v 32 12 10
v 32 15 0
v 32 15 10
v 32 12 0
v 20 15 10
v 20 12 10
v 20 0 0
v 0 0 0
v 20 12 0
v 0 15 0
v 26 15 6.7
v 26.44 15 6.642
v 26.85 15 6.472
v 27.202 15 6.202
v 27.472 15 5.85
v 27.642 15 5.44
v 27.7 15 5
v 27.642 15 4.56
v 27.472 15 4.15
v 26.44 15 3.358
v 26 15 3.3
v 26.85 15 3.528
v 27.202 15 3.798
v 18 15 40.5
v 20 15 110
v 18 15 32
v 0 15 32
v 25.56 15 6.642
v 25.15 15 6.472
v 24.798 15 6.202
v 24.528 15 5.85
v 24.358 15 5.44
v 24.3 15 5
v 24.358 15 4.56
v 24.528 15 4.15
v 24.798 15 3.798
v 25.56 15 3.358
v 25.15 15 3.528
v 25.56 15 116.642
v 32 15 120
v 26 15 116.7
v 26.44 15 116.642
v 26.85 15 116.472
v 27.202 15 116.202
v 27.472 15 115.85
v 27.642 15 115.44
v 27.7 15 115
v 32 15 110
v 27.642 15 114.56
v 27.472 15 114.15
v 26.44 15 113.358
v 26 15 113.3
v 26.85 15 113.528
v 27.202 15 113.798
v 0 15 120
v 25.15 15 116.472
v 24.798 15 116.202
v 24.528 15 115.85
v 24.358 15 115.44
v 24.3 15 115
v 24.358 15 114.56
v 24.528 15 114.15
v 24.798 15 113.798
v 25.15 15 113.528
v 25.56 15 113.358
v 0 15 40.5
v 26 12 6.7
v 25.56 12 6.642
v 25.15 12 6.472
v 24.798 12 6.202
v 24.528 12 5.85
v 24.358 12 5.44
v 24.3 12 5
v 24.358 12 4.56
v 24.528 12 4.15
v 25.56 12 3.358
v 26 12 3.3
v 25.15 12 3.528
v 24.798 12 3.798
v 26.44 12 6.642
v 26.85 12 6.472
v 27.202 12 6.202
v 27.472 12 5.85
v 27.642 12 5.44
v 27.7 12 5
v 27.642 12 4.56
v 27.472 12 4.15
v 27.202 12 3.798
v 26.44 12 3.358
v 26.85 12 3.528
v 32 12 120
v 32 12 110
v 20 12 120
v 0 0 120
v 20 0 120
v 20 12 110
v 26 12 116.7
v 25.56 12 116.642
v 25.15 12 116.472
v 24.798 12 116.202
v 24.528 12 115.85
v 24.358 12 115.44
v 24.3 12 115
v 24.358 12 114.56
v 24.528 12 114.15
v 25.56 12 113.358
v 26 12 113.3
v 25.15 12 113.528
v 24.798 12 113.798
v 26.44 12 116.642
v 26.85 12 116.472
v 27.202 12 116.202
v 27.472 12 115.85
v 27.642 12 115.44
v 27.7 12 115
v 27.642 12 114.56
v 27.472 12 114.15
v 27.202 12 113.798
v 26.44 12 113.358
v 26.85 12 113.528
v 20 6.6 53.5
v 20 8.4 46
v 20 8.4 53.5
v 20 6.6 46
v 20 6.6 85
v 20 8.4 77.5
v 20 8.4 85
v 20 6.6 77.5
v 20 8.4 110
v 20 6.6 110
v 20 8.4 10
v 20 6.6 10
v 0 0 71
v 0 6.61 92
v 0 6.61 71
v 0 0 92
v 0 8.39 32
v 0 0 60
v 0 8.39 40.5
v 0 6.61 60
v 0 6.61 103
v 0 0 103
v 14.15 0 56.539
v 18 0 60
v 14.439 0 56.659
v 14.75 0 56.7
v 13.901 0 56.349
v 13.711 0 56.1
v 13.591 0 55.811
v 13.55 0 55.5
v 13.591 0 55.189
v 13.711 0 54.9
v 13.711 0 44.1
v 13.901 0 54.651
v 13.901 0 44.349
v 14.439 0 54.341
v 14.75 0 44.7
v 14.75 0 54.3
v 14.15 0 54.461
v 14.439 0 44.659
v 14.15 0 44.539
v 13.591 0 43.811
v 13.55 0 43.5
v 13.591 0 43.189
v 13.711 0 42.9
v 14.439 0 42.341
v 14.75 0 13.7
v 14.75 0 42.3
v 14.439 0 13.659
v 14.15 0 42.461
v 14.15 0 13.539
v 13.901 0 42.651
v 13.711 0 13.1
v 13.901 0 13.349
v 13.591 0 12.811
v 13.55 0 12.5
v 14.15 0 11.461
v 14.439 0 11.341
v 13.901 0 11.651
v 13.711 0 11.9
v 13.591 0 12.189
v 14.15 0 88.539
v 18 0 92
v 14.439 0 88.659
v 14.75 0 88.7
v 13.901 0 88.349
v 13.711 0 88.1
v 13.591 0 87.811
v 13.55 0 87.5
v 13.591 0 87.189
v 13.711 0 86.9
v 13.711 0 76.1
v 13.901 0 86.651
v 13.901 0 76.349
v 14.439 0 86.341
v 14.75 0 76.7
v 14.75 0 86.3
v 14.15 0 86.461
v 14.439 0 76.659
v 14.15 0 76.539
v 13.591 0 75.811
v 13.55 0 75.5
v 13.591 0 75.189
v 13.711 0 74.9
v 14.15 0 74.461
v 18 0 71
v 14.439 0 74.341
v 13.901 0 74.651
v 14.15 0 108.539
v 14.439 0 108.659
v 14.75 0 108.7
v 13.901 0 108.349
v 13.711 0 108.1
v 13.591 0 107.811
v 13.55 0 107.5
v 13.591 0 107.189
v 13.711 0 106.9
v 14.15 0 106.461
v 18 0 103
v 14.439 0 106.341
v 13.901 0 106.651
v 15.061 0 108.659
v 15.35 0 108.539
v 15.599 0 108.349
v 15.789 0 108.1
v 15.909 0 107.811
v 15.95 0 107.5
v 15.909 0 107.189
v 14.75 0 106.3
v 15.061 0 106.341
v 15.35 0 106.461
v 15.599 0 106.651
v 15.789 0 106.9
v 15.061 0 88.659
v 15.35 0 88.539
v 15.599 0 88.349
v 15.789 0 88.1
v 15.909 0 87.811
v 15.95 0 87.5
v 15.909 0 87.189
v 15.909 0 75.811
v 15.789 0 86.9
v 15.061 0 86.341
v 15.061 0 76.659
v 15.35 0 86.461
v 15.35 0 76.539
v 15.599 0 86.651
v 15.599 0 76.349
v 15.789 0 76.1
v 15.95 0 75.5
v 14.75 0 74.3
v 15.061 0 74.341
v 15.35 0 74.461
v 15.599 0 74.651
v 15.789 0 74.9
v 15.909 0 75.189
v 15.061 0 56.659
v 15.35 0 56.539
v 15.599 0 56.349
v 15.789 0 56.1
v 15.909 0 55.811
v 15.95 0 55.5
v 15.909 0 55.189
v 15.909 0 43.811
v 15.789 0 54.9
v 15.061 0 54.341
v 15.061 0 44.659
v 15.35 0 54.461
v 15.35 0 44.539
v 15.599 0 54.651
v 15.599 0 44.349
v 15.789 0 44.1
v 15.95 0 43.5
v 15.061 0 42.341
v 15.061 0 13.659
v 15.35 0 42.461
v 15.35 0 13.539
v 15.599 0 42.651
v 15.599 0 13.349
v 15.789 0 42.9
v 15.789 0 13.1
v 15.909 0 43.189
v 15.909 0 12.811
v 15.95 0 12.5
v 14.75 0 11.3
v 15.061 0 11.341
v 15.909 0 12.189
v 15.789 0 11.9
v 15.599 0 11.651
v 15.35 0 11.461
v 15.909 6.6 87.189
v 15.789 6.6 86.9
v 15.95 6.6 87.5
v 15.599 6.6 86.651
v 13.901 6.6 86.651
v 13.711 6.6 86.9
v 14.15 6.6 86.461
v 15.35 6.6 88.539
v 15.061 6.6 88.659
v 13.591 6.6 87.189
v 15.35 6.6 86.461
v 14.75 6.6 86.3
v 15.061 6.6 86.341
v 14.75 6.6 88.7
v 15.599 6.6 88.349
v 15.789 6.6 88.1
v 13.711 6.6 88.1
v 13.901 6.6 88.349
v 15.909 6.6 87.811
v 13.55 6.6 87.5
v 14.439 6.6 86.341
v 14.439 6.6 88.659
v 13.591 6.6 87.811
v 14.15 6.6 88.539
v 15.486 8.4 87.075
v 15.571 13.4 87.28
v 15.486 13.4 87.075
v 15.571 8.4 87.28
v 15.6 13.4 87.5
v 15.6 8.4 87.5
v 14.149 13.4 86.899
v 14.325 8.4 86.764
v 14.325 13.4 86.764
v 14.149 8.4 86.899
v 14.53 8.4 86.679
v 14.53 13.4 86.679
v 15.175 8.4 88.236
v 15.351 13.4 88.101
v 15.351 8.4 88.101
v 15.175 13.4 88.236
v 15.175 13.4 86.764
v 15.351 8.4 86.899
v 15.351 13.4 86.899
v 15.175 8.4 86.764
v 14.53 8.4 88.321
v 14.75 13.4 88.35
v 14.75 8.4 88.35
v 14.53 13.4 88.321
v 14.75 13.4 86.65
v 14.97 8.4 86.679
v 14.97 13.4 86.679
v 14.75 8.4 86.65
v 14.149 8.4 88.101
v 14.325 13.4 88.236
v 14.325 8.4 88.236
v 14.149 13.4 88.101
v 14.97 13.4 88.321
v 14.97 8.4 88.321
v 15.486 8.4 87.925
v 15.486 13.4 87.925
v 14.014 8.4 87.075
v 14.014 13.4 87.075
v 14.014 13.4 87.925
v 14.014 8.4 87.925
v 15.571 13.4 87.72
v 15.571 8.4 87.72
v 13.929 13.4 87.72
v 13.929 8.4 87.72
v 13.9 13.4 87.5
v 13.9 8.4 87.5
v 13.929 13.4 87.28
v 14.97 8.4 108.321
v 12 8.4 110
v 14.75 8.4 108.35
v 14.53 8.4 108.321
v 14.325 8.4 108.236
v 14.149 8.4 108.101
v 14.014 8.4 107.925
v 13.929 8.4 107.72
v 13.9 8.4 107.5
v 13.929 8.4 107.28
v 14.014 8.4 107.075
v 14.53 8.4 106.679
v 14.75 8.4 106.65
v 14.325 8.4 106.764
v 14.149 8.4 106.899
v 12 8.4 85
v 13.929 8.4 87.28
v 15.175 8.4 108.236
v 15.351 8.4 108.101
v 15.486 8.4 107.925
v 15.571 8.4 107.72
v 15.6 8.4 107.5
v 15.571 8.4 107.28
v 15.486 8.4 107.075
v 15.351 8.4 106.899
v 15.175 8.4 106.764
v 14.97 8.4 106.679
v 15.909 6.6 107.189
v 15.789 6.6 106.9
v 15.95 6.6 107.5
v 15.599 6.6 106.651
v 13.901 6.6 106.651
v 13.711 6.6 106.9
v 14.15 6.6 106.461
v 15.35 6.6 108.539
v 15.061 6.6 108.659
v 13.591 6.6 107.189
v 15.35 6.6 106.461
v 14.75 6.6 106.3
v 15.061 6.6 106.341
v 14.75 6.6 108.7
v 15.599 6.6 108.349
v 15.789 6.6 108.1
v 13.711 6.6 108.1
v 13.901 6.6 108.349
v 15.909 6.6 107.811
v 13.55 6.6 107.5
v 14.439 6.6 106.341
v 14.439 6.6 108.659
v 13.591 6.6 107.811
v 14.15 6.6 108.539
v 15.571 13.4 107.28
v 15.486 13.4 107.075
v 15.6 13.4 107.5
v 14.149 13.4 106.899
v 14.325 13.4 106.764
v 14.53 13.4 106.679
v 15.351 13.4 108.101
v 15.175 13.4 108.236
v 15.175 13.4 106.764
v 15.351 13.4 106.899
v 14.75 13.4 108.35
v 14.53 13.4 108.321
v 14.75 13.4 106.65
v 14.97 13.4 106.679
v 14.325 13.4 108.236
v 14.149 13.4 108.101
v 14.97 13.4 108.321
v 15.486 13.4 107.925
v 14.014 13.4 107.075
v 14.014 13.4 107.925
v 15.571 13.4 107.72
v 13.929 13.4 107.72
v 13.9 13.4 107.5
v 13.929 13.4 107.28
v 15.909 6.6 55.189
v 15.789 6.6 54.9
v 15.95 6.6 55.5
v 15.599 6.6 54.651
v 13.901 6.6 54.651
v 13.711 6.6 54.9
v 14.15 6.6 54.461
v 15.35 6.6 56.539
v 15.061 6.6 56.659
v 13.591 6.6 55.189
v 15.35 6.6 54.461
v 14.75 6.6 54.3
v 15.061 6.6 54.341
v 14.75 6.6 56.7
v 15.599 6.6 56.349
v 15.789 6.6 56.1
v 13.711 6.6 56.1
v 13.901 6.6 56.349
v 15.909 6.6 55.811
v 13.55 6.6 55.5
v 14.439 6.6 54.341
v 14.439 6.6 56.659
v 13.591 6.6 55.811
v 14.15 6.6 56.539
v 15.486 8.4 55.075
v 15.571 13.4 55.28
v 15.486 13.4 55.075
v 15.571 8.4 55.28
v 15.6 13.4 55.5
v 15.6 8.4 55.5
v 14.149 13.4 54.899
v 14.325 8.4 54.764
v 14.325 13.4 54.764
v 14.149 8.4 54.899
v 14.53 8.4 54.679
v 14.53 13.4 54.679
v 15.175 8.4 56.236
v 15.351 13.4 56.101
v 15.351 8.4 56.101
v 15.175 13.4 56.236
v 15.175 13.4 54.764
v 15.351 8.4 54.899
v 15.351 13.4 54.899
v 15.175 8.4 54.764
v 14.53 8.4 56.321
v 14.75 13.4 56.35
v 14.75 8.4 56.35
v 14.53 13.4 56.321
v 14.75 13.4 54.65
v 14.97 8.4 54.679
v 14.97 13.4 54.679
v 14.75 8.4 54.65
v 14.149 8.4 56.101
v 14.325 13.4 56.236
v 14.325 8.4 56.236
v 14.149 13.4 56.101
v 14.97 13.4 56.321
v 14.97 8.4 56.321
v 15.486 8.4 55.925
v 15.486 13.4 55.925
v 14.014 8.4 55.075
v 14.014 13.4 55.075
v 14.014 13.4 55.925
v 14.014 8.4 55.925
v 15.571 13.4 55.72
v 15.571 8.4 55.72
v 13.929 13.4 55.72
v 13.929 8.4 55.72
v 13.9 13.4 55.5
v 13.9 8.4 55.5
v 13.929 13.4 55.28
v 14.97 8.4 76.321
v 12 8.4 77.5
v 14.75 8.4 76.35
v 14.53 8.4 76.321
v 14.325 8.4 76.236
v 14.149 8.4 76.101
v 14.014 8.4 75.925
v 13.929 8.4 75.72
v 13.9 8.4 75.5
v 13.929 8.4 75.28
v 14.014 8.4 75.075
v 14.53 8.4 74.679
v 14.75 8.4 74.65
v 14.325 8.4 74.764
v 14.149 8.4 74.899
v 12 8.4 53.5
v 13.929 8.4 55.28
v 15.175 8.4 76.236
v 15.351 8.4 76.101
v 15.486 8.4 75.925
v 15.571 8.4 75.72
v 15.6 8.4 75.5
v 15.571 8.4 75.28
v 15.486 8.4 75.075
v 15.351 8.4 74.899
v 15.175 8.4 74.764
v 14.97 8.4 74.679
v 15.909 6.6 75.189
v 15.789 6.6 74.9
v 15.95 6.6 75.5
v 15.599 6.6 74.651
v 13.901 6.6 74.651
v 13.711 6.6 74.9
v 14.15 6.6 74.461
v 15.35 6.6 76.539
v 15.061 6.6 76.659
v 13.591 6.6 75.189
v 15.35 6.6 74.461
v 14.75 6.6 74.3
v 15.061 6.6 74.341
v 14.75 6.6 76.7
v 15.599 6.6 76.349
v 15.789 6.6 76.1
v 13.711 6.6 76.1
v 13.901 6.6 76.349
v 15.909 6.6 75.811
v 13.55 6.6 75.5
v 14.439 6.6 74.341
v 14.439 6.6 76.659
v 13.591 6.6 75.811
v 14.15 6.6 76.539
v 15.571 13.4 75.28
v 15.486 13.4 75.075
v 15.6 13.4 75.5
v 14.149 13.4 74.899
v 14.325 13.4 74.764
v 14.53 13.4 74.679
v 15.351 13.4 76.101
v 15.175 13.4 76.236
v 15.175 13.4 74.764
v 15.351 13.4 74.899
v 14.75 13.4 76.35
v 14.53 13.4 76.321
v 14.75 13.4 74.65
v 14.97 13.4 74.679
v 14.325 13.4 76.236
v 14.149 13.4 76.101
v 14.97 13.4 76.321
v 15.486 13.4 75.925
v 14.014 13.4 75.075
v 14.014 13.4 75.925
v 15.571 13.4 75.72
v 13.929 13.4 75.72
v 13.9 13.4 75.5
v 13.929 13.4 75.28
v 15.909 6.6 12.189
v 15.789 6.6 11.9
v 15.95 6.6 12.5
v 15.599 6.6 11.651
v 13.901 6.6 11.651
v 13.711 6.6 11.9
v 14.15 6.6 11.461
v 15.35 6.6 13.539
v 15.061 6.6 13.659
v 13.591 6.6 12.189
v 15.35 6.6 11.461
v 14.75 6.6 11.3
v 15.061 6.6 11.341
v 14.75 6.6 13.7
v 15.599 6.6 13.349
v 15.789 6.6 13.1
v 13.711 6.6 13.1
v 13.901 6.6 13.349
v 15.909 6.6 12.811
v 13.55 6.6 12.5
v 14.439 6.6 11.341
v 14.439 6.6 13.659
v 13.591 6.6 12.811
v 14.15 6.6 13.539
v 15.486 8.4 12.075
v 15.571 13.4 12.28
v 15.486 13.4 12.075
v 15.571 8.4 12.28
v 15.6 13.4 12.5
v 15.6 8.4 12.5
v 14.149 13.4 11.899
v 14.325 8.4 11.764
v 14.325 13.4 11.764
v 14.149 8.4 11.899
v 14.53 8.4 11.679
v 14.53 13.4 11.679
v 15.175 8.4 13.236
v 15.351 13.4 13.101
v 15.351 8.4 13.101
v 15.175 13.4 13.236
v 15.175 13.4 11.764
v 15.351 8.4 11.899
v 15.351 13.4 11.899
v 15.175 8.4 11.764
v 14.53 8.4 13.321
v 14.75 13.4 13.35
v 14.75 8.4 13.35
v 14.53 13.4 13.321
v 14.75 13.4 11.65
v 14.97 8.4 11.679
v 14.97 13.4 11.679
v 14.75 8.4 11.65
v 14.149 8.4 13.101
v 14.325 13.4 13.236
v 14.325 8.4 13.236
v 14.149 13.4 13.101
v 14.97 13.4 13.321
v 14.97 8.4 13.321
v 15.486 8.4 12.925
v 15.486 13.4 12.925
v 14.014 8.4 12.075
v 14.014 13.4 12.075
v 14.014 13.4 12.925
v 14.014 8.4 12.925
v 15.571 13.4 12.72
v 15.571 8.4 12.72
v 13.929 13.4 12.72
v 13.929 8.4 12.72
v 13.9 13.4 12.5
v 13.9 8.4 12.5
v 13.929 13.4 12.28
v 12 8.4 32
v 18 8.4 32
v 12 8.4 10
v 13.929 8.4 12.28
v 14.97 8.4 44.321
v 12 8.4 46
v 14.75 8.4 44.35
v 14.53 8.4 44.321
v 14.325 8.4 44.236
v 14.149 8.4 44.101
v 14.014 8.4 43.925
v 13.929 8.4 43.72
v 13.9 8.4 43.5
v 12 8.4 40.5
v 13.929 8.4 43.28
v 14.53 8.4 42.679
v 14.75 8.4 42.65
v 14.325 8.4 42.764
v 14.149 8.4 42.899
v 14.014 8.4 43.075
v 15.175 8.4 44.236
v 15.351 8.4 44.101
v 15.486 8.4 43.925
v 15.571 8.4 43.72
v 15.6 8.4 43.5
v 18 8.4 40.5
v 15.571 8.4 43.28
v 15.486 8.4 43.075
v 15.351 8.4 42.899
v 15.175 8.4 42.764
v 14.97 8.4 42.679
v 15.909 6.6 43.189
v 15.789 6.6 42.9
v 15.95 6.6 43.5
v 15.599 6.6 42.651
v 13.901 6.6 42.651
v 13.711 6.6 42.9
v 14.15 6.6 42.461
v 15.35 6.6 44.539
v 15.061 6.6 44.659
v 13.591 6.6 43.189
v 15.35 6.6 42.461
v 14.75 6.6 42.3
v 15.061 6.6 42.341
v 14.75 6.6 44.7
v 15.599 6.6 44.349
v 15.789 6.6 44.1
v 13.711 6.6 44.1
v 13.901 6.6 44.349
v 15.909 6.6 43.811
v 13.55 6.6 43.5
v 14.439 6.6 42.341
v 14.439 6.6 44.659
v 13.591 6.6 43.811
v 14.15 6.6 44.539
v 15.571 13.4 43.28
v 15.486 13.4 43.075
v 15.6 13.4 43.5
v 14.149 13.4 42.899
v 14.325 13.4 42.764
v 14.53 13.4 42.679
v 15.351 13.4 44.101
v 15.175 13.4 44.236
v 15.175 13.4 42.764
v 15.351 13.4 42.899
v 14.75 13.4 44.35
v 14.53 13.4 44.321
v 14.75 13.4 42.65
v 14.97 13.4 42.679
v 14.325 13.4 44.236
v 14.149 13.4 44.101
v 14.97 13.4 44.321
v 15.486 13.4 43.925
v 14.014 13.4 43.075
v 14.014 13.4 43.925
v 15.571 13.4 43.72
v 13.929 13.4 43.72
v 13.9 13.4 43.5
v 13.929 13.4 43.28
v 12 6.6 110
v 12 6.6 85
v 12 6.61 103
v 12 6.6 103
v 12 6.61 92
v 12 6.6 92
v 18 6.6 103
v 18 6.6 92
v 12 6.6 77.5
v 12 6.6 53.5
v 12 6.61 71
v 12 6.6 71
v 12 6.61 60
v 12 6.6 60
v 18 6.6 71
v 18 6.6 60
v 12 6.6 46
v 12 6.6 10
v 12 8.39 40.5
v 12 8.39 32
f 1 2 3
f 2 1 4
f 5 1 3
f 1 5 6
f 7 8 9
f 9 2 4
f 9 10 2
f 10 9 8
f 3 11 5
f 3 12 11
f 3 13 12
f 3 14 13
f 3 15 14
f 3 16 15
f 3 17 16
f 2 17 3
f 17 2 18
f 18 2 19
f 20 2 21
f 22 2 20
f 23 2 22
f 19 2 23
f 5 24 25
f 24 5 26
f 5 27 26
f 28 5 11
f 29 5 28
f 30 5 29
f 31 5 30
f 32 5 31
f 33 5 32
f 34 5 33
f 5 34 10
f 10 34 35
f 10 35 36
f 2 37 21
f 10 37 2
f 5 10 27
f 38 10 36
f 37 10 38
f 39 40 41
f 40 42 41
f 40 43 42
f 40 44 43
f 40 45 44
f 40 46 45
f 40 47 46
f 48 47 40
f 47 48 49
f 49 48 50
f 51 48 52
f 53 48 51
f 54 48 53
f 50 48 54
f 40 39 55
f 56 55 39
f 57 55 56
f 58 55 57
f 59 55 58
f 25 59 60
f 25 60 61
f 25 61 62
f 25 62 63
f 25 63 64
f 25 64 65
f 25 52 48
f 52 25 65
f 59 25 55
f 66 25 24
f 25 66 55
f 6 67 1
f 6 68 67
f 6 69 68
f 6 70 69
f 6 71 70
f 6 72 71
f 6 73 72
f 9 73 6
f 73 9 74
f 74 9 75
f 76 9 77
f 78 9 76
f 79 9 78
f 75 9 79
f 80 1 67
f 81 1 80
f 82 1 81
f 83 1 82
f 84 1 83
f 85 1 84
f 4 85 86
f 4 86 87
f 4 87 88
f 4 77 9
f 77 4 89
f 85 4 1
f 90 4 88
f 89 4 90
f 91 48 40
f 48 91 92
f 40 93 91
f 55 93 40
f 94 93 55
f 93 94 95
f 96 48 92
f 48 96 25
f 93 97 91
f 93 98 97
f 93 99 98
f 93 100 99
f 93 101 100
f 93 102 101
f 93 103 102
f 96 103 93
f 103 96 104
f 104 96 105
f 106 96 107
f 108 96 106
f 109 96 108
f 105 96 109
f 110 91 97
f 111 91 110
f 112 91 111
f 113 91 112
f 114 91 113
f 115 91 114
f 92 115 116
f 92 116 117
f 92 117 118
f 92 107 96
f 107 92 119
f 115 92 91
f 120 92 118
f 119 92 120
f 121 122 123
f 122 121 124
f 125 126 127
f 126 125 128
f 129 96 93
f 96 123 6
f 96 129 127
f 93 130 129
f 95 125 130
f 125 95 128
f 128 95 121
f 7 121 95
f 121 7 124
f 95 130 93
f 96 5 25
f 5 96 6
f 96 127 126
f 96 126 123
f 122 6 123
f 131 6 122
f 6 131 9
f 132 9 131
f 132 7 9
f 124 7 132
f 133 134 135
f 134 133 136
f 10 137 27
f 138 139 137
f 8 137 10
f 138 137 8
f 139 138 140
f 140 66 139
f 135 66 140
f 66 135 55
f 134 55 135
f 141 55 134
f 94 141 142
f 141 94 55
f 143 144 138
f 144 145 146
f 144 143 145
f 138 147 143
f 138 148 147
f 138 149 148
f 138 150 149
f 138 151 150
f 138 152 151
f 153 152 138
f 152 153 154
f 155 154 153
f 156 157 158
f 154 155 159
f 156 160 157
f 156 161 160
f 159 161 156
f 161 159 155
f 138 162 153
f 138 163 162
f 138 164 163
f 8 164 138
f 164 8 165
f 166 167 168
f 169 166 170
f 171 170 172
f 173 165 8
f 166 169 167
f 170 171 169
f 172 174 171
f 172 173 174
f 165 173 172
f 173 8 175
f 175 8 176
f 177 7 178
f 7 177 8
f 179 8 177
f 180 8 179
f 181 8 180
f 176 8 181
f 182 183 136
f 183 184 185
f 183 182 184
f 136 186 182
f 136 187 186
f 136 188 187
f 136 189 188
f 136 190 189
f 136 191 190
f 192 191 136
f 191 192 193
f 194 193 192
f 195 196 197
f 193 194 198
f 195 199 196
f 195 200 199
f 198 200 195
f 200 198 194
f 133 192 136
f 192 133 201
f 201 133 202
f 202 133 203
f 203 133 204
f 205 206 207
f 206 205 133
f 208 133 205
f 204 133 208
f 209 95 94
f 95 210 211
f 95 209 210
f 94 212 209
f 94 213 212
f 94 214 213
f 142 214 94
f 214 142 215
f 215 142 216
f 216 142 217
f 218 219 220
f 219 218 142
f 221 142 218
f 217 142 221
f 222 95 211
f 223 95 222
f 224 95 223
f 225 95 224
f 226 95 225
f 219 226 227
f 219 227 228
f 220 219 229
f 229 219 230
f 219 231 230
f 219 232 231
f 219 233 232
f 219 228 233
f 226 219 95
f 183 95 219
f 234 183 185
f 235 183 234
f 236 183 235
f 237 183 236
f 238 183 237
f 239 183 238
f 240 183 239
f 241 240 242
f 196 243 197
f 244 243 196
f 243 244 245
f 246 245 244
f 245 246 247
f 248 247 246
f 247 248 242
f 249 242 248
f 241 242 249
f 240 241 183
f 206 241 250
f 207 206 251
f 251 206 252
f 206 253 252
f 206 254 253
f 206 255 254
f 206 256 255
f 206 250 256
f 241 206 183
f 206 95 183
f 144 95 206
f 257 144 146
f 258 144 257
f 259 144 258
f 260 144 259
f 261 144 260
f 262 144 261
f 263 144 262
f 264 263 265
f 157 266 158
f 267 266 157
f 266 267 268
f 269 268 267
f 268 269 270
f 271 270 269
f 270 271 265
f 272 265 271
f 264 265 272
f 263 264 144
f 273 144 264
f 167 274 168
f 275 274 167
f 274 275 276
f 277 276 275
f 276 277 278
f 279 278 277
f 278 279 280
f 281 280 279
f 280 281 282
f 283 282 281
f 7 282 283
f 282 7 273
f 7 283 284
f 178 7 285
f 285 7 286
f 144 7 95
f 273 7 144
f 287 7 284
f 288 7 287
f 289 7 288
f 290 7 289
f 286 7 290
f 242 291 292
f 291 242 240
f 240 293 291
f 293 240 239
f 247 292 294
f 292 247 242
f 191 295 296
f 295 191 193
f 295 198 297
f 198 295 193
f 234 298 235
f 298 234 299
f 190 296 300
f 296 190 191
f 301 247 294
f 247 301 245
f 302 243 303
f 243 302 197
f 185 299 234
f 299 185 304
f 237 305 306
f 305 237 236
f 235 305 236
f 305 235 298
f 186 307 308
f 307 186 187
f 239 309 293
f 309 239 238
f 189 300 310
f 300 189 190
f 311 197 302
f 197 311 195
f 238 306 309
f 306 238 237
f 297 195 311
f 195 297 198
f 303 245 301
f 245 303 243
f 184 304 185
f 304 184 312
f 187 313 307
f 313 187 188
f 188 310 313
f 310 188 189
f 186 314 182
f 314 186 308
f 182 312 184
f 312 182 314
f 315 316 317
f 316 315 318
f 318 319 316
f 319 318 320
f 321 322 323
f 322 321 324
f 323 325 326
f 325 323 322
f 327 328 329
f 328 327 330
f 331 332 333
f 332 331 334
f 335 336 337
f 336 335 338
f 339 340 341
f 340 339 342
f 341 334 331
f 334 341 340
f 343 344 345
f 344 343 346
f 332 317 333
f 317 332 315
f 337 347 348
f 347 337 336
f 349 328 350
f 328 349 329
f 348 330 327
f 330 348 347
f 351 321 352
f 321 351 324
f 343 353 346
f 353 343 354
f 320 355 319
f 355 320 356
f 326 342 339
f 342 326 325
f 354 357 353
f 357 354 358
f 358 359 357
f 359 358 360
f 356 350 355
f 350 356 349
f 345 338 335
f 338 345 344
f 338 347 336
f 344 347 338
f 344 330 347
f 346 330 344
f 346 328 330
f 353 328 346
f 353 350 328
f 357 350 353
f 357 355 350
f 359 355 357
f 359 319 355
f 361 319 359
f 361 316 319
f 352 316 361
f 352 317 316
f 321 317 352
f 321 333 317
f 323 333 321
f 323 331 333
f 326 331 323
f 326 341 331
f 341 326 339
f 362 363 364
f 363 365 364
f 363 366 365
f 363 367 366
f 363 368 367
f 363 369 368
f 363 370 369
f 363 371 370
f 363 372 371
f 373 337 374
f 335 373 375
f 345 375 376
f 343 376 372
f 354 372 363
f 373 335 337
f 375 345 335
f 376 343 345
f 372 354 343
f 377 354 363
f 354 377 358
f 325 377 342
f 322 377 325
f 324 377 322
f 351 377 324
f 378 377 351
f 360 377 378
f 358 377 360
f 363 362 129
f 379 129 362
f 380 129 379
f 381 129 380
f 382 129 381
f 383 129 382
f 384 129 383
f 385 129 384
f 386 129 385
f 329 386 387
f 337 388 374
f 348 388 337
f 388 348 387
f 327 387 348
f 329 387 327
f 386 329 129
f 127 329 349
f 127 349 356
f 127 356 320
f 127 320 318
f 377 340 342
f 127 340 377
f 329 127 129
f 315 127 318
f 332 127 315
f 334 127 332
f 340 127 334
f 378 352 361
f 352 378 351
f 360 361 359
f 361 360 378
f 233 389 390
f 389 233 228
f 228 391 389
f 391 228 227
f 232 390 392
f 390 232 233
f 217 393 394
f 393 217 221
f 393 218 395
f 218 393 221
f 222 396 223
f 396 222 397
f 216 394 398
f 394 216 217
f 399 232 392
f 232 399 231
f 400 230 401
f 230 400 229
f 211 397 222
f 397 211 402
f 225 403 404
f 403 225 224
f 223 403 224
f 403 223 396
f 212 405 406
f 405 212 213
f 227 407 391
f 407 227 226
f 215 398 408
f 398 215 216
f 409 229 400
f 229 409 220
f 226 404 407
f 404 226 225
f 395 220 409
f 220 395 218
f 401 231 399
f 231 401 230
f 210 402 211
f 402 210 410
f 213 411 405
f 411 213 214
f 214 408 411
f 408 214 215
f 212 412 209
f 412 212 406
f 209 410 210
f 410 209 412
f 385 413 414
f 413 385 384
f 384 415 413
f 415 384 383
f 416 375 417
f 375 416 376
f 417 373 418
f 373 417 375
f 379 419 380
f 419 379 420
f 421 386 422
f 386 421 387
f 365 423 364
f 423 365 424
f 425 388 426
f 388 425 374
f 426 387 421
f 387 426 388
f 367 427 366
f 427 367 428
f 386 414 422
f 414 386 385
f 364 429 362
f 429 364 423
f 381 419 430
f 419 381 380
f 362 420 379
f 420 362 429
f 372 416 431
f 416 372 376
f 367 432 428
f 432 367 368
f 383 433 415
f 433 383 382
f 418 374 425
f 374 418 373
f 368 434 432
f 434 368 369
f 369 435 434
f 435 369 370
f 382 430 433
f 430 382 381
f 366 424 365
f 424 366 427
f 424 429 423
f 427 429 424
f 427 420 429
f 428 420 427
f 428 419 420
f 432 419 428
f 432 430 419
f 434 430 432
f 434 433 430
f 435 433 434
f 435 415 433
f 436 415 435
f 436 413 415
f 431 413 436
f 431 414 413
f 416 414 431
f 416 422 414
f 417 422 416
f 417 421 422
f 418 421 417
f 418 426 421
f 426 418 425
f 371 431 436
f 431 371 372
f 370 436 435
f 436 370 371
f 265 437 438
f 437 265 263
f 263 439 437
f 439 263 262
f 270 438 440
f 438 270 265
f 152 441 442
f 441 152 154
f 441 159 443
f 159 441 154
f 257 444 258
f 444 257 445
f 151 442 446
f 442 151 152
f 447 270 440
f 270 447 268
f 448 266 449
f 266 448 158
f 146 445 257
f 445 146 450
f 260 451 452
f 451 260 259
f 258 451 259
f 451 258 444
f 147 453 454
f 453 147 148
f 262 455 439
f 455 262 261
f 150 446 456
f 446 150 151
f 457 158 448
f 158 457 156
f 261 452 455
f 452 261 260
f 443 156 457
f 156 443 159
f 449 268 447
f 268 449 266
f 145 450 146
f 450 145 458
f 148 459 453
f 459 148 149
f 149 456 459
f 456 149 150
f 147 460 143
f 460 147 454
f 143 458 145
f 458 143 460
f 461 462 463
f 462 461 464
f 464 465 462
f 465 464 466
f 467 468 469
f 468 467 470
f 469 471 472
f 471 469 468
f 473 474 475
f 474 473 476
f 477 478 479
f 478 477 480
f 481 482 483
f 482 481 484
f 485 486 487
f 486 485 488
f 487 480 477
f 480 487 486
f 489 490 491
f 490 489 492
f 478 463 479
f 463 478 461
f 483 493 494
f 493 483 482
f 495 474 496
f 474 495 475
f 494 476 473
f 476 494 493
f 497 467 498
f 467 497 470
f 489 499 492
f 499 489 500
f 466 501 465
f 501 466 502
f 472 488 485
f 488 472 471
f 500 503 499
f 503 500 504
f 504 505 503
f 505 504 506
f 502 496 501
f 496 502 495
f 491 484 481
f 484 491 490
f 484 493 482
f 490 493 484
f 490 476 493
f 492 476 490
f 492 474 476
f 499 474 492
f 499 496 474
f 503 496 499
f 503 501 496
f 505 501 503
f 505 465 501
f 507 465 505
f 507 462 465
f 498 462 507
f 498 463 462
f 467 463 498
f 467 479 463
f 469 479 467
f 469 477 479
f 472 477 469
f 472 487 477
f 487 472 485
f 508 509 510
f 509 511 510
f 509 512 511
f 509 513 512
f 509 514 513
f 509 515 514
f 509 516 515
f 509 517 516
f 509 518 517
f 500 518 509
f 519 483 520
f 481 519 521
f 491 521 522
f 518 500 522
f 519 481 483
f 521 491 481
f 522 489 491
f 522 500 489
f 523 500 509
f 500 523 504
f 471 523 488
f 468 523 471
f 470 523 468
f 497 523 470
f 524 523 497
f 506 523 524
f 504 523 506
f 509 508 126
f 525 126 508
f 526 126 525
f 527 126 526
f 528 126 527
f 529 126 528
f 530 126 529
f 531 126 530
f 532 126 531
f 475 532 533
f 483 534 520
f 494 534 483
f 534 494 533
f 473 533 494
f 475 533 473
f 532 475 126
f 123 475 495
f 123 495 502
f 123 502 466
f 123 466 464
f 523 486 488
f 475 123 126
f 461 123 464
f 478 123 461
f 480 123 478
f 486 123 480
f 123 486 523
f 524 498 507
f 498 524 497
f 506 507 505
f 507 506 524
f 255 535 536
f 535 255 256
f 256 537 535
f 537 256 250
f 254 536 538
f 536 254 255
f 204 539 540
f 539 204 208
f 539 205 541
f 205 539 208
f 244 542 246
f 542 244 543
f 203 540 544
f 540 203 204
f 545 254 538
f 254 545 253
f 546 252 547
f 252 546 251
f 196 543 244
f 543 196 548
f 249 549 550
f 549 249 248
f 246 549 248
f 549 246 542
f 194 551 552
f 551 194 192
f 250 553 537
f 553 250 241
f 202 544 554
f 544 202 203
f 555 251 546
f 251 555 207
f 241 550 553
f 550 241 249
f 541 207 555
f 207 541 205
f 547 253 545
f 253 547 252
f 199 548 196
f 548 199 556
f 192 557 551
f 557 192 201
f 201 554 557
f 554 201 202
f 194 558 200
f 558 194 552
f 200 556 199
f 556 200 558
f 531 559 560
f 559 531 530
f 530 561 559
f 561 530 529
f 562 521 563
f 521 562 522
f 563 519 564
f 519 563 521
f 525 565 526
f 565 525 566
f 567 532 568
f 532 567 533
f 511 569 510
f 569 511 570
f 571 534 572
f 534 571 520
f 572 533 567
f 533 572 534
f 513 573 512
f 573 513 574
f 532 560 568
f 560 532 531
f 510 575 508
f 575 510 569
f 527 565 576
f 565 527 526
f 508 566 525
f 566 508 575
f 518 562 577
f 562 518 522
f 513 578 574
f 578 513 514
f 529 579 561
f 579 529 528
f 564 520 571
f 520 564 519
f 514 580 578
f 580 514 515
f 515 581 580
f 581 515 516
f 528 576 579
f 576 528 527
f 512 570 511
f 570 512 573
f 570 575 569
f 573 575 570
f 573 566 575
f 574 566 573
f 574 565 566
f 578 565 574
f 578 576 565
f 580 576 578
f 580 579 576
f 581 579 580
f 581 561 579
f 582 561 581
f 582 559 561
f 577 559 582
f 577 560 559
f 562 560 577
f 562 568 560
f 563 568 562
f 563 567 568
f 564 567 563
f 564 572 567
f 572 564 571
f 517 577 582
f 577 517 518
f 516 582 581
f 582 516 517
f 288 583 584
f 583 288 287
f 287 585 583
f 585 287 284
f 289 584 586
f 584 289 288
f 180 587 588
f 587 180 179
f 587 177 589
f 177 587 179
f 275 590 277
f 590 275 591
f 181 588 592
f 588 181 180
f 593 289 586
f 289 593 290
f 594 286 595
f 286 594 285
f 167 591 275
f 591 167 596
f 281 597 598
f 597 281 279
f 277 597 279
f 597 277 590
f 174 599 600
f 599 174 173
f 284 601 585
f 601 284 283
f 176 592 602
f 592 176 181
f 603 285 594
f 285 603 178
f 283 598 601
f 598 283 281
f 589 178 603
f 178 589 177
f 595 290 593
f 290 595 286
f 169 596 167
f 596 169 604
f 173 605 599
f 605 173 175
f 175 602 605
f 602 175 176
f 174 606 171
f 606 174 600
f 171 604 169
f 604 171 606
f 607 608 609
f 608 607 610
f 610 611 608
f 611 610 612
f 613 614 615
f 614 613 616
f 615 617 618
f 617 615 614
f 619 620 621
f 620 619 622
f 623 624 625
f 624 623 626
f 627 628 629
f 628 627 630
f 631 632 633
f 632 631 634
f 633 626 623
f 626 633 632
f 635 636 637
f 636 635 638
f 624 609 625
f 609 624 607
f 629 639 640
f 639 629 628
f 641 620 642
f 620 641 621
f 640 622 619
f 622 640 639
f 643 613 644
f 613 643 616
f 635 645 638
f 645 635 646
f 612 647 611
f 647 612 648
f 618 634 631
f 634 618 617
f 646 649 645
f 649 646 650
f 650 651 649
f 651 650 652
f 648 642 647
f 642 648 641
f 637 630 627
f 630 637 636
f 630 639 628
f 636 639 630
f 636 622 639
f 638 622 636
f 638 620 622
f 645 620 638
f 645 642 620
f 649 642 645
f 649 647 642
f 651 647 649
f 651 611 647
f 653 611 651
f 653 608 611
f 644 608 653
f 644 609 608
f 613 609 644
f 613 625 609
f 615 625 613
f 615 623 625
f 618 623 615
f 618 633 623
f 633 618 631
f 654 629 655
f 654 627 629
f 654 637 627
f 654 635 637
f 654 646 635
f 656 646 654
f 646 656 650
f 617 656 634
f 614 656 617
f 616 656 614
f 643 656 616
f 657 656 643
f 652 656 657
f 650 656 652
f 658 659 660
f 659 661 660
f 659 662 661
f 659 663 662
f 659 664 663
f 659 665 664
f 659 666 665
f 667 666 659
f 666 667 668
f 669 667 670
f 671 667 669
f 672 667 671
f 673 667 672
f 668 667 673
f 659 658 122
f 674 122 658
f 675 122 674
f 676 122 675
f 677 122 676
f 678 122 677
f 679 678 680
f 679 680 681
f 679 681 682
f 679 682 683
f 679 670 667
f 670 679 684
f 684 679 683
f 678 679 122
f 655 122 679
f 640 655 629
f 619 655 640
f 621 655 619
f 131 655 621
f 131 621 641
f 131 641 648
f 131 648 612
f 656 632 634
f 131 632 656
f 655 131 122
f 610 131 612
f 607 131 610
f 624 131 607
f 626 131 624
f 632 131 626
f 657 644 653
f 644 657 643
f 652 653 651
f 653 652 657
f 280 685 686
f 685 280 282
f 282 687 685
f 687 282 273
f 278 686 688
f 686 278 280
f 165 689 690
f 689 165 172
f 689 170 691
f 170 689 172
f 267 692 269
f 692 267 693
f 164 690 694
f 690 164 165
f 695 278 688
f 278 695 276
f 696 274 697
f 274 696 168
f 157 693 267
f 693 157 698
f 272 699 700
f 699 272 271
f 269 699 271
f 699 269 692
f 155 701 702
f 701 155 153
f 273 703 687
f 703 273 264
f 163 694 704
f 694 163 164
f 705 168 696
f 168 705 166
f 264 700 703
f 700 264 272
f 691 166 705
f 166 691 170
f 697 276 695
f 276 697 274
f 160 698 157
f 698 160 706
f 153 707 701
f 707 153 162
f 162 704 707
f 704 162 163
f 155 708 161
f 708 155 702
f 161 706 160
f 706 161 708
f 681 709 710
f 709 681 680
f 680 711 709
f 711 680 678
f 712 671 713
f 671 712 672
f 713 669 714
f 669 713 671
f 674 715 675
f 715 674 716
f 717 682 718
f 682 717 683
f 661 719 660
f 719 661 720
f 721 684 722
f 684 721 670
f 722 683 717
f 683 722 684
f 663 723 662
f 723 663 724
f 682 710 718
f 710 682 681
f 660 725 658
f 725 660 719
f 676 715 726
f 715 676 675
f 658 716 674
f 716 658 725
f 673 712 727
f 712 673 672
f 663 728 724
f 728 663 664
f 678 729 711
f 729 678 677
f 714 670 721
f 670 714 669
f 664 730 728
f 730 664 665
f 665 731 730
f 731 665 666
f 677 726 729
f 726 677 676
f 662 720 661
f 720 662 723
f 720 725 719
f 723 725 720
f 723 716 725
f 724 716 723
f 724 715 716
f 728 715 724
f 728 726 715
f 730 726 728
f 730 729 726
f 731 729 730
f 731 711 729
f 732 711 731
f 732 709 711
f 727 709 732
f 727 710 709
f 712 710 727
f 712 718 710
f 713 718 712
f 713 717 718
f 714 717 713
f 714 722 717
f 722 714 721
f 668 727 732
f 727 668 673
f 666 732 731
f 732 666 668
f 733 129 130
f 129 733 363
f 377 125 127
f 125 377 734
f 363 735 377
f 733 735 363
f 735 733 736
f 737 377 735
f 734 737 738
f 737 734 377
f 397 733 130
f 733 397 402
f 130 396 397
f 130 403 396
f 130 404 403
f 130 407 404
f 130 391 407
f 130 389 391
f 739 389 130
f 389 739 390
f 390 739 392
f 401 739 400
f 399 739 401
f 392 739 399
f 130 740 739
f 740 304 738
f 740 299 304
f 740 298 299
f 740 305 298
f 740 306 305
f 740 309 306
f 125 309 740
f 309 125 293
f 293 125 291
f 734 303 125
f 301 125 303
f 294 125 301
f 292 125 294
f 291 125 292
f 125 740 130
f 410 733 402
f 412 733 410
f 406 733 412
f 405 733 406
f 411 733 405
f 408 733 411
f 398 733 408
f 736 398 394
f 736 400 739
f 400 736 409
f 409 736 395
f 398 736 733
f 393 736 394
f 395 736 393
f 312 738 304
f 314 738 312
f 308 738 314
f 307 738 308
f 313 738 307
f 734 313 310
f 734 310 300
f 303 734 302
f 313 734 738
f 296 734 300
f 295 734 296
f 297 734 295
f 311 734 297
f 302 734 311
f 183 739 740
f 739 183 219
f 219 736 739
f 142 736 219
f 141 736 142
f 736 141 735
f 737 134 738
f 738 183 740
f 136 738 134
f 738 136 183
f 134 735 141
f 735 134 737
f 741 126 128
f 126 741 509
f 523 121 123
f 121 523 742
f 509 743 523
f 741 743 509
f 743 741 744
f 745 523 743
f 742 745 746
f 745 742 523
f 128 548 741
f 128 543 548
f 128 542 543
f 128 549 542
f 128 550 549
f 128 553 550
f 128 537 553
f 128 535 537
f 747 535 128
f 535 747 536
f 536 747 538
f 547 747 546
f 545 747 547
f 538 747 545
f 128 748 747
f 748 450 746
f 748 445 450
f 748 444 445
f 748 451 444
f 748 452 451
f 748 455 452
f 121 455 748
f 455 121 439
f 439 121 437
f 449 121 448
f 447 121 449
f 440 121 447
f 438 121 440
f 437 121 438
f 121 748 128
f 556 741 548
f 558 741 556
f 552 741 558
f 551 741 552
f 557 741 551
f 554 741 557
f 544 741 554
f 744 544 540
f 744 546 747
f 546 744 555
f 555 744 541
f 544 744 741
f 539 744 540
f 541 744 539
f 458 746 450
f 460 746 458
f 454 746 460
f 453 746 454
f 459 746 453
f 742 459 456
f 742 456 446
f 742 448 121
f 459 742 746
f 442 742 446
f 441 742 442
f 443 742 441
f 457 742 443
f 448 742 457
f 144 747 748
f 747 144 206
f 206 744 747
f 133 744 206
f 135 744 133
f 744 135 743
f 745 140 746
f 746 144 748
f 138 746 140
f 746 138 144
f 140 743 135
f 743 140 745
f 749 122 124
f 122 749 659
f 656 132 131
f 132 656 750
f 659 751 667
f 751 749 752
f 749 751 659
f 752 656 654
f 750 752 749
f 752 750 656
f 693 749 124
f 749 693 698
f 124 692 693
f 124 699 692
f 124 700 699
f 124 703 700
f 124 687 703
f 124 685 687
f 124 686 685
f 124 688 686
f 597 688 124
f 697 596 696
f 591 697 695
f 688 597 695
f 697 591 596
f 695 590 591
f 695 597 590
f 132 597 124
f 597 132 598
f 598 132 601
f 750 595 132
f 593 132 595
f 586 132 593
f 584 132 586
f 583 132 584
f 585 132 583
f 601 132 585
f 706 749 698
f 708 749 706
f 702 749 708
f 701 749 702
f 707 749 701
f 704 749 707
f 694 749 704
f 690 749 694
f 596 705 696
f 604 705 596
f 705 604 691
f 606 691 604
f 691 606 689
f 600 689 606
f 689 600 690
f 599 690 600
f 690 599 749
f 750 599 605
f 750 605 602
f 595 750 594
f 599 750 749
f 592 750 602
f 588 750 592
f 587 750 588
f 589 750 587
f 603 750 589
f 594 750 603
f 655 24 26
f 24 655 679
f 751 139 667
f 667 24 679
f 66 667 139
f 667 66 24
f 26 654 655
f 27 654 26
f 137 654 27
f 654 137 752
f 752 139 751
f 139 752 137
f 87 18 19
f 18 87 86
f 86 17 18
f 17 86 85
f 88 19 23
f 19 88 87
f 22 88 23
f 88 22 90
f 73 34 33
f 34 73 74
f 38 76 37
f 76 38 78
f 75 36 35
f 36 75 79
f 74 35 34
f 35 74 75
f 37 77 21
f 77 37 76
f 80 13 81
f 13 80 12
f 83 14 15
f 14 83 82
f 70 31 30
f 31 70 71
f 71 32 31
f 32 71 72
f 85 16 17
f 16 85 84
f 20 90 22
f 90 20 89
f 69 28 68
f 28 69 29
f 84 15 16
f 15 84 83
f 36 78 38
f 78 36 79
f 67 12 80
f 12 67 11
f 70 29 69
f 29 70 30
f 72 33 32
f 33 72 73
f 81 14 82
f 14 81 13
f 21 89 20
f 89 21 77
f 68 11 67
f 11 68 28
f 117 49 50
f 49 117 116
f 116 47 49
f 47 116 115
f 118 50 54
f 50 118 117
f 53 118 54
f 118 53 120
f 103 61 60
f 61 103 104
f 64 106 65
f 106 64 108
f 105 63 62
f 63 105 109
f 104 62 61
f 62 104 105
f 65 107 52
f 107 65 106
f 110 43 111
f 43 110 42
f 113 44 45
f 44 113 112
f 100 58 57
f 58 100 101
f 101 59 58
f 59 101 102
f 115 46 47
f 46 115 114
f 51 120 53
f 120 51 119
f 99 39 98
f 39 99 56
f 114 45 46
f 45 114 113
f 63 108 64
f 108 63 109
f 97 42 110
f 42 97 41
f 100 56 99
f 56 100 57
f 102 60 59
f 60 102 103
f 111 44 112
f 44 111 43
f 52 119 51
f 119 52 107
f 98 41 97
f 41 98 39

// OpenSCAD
// Rack for three display boards, held by their short edge. Units: mm.
// Axes: x = width (0 = side against the stand, slots open to +x), y = depth (0 = front), z = height (0 = bottom).
// Every size that depends on a real part or on the printer is a named number here, so one change fixes the model.
// Command line: openscad -D print=true -o stl/rack.stl rack.scad
//               openscad -D print=true -D test_piece=true -o stl/rack_test.stl rack.scad

print = false;        // true = rotate so the left face lies on the bed and the slots open upward
test_piece = false;   // true = only the middle board's slot, for a quick fit test

// --- printer-dependent ---
play = 0.2;           // extra slot width; tune with the test piece
pcb_t = 1.6;
slot_w = pcb_t + play;

// --- bar ---
bar_w = 20;
bar_d = 15;
bar_h = 120;
slot_depth = 8;       // reaches the corner holes
end_gap = 10;         // top and bottom margin, also the height of the stand tabs
mid_gap = 7.5;

// --- boards, top to bottom: 6-digit, 4-digit, LCD (estimates, see measurements.md) ---
board_short = [25, 24, 36];
hole_edge = 2.75;               // corner hole centre from the clamped edge
hole_span = [20, 20, 31];       // distance between the two corner holes of a board
win = [[7, 18], [6.5, 17.5], [22, 30.5]];   // plug window z range, measured from the board's bottom edge
win_face = ["front", "front", "back"];      // wall that gets the window
win_reach = 6;                  // window length past the clamped edge, covers the plug body

// --- screws ---
screw_clear_d = 2.4;            // M2 clearance in the front wall
screw_pilot_d = 1.7;            // M2 self-tapping pilot in the back wall
screw_pilot_len = 5;
min_wall = 1.5;

// --- stand tab (placeholders until the stand is measured) ---
tab_t = 3;
tab_len = 12;
tab_hole_d = 3.4;

floor_x = bar_w - slot_depth;
slot_y = (bar_d - slot_w) / 2;
screw_x = floor_x + hole_edge;

// Top edge of board i; recursion keeps it a pure function of the parameters.
function top_of(i) = i == 0 ? bar_h - end_gap : top_of(i - 1) - board_short[i - 1] - mid_gap;
function bottom_of(i) = top_of(i) - board_short[i];
function hole_zs(i) = [(board_short[i] - hole_span[i]) / 2, (board_short[i] + hole_span[i]) / 2];
// Distance from z to the interval [a, b]; 0 if inside.
function dist_to(z, a, b) = z < a ? a - z : z > b ? z - b : 0;

assert(bottom_of(2) >= end_gap - 0.01, "boards do not fit: last board enters the bottom tab area");
assert(slot_depth >= hole_edge + screw_pilot_d / 2 + min_wall, "slot too shallow for the corner holes");
assert(bar_d - slot_y - slot_w >= screw_pilot_len + min_wall, "back wall too thin for the screw pilots");
assert(len([for (i = [0:2], z = hole_zs(i)) if (dist_to(z, win[i][0], win[i][1]) < screw_pilot_d / 2 + min_wall) 1]) == 0,
       "a plug window comes too close to a screw hole");

module slot(i) {
  translate([floor_x, slot_y, bottom_of(i)]) cube([slot_depth + 1, slot_w, board_short[i]]);
}

// Window in the front or back wall, open to the left face, so the plug and cable leave sideways.
module window(i) {
  y0 = win_face[i] == "front" ? -1 : slot_y + slot_w - 0.01;
  y1 = win_face[i] == "front" ? slot_y + 0.01 : bar_d + 1;
  translate([-1, y0, bottom_of(i) + win[i][0]])
    cube([floor_x + win_reach + 1, y1 - y0, win[i][1] - win[i][0]]);
}

// Both screws go from the front, through the board hole, into the back wall.
module screws(i) {
  for (z = hole_zs(i)) translate([screw_x, 0, bottom_of(i) + z]) rotate([-90, 0, 0]) {
    translate([0, 0, -1]) cylinder(d = screw_clear_d, h = slot_y + 1.01, $fn = 24);
    translate([0, 0, slot_y + slot_w]) cylinder(d = screw_pilot_d, h = screw_pilot_len, $fn = 24);
  }
}

module tabs() {
  for (z0 = [0, bar_h - end_gap])
    translate([bar_w / 2, bar_d - tab_t, z0]) cube([bar_w / 2 + tab_len, tab_t, end_gap]);
}

module tab_holes() {
  for (z0 = [0, bar_h - end_gap])
    translate([bar_w + tab_len / 2, bar_d - tab_t - 1, z0 + end_gap / 2])
      rotate([-90, 0, 0]) cylinder(d = tab_hole_d, h = tab_t + 2, $fn = 24);
}

module rack() {
  difference() {
    union() { cube([bar_w, bar_d, bar_h]); tabs(); }
    for (i = [0:2]) { slot(i); window(i); screws(i); }
    tab_holes();
  }
}

module part() {
  if (test_piece)
    intersection() {
      rack();
      translate([-1, -1, bottom_of(1) - 4]) cube([bar_w + tab_len + 2, bar_d + 2, board_short[1] + 8]);
    }
  else rack();
}

if (print) translate([bar_h, 0, 0]) rotate([0, -90, 0]) part();
else part();
